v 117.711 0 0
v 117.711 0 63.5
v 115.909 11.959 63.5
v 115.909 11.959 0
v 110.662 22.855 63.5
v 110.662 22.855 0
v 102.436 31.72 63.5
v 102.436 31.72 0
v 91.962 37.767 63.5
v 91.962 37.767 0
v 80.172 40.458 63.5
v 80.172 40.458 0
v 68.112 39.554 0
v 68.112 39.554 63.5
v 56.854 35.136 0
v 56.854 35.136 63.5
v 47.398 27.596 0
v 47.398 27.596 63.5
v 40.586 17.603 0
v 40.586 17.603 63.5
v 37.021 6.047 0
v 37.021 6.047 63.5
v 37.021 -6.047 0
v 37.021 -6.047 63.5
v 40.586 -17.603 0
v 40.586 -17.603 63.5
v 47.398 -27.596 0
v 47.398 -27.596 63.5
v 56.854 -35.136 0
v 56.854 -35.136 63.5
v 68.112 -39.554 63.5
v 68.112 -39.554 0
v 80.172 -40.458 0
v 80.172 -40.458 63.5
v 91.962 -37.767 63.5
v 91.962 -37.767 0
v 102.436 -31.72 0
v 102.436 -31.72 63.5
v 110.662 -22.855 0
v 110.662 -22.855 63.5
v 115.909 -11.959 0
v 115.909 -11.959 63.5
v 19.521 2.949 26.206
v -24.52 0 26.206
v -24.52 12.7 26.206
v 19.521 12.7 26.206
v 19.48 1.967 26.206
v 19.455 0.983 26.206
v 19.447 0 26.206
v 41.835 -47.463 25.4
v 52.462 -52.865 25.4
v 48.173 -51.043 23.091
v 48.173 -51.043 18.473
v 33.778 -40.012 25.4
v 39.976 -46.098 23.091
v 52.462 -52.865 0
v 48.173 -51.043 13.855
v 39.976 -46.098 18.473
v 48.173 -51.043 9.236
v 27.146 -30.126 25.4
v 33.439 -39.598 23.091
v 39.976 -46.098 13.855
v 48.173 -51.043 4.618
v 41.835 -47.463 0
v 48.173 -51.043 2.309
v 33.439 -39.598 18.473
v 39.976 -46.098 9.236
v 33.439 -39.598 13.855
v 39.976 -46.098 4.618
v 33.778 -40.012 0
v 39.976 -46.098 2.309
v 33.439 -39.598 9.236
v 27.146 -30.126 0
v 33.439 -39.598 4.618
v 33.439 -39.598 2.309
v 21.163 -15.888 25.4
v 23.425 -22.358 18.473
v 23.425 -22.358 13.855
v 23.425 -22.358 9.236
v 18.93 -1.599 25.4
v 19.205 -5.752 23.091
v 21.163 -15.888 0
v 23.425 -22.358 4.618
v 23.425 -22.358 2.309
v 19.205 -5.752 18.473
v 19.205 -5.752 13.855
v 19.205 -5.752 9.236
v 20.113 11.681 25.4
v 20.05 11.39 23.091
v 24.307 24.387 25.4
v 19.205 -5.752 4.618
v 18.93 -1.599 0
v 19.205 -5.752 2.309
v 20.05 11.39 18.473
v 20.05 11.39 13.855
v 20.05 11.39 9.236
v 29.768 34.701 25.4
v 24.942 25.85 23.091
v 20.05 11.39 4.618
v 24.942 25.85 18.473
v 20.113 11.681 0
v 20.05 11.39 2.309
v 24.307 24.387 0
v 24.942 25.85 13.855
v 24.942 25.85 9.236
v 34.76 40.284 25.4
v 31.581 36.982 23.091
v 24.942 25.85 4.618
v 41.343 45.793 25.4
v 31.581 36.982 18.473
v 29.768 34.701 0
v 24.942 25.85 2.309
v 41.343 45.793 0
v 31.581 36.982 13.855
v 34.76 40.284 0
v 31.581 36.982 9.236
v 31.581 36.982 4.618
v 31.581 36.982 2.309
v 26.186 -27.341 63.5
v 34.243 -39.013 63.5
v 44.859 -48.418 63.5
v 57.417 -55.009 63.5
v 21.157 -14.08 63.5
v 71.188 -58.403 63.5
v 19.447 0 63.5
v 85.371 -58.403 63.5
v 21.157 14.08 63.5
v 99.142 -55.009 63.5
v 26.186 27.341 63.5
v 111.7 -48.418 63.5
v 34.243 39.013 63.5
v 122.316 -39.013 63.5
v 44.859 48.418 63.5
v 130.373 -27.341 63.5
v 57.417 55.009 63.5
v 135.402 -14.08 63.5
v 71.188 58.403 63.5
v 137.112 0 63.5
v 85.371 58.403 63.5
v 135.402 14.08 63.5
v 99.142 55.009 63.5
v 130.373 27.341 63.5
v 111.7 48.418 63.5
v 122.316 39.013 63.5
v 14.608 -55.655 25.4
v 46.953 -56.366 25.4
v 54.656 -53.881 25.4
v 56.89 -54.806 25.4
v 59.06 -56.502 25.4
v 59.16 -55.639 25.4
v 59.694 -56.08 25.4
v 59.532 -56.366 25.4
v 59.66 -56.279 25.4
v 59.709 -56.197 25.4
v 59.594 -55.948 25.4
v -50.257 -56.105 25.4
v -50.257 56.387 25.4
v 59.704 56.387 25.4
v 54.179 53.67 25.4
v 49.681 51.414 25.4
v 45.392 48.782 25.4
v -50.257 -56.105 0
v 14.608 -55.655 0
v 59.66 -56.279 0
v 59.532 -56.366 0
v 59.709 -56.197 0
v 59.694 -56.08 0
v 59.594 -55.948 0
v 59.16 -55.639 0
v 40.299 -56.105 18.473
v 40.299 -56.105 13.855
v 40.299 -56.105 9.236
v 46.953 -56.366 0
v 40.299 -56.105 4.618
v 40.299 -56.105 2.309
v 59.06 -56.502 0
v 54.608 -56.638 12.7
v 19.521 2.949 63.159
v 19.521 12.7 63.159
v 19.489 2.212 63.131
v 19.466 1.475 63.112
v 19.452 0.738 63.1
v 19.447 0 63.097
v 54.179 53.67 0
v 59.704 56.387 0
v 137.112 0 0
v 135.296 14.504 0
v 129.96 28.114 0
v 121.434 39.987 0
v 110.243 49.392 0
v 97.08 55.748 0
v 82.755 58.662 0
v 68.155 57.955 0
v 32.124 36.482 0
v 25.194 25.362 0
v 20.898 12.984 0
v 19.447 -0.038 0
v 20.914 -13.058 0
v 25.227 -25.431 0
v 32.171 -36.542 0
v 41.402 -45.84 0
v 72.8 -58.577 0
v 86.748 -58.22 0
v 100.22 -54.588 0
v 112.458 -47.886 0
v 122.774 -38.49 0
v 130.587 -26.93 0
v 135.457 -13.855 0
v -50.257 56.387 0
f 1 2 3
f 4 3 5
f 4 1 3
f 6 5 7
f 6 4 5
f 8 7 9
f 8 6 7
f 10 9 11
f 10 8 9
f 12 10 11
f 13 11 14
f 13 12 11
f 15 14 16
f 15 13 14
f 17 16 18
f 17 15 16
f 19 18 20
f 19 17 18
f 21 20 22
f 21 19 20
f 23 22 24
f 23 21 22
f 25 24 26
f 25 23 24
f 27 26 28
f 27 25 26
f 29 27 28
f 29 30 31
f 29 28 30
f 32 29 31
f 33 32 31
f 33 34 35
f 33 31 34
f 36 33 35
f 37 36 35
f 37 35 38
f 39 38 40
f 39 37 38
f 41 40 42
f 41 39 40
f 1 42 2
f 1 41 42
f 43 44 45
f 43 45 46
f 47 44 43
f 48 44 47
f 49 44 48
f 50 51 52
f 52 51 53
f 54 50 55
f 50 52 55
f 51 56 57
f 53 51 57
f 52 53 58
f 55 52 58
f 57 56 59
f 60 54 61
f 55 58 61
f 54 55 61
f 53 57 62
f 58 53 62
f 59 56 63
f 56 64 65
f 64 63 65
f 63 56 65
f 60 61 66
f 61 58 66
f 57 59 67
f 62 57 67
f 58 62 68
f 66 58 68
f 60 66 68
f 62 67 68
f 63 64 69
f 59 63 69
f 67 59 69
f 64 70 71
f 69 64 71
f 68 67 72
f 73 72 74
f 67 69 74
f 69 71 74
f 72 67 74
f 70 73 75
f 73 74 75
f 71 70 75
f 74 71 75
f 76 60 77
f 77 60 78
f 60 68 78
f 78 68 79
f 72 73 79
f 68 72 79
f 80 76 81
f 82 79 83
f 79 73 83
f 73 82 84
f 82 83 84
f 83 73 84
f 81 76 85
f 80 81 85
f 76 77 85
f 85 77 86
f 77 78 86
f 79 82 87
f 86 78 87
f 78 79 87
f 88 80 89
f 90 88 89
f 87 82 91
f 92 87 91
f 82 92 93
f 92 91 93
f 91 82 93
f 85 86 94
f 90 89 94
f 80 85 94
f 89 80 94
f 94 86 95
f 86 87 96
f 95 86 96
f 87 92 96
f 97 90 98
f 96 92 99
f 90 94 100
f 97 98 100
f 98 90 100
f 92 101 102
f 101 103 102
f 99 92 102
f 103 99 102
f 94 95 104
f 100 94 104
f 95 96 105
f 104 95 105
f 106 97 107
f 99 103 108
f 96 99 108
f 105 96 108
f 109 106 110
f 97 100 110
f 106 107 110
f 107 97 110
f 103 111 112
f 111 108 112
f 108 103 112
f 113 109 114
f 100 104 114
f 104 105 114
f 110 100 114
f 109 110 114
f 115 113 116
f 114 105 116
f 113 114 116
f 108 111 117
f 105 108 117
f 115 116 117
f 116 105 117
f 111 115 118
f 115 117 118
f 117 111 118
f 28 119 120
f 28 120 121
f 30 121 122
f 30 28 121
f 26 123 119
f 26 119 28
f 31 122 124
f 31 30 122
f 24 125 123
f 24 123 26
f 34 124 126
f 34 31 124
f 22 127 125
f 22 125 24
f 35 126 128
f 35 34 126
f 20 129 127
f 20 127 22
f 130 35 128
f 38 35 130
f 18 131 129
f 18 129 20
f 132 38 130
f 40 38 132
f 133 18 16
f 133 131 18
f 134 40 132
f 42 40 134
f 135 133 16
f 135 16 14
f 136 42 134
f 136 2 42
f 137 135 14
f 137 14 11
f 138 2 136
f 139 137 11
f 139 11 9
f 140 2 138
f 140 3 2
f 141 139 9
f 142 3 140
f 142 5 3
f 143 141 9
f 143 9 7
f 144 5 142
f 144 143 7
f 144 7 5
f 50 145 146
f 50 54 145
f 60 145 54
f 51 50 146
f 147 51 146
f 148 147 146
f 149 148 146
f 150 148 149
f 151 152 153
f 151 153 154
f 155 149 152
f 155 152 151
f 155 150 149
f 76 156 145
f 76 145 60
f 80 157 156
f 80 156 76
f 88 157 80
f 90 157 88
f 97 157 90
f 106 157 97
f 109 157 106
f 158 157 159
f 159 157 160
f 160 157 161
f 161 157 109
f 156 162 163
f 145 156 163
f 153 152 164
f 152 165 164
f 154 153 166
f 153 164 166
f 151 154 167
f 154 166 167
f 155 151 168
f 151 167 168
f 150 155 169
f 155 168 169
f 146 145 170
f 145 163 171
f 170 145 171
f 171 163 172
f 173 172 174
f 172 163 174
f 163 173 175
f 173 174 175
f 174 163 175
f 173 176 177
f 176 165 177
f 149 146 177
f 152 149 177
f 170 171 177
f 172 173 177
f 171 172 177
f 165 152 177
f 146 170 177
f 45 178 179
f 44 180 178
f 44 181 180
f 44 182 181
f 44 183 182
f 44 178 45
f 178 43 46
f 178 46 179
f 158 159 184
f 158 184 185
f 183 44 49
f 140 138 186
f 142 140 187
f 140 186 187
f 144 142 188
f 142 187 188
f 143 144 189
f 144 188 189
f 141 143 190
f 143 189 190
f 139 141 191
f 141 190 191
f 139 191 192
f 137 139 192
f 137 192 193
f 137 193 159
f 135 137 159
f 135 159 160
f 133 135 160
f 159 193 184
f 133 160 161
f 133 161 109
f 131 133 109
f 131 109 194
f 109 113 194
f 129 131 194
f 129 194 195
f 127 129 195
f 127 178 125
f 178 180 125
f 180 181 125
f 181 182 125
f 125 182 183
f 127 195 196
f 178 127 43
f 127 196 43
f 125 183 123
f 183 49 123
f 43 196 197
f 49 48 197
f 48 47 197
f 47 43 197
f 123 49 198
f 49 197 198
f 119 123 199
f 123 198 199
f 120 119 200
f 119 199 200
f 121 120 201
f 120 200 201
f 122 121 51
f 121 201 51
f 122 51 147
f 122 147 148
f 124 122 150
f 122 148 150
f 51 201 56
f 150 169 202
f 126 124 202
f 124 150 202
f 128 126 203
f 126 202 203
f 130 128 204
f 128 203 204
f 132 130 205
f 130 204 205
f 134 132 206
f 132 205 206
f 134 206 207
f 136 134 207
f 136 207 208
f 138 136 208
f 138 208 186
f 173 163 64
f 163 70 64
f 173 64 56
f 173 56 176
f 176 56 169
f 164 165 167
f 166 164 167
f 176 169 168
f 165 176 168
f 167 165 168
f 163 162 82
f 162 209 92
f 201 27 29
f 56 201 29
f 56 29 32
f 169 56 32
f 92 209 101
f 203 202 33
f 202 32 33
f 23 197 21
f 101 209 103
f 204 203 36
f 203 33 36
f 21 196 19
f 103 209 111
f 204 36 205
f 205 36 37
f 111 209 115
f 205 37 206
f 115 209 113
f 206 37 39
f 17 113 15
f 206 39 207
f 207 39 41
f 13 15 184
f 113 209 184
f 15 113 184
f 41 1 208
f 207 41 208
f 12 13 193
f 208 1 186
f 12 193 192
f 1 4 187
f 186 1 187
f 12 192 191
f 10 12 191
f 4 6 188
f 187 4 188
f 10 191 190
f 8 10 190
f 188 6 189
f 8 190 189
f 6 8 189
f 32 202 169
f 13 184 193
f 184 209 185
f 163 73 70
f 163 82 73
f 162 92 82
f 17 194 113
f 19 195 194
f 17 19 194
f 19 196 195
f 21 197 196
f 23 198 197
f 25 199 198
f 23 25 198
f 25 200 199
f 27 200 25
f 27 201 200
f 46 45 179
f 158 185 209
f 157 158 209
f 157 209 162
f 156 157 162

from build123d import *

# Parameters (mm, degrees)
F0_R     = 58.8324156358
F1_DEPTH = 63.5
F2_R     = 40.5716909801
F3_DEPTH = 63.501
F5_DEPTH = 25.4
F7_DEPTH = 12.7


with BuildPart() as f1:
    # F0 (on Top) → F1 (new body)
    with BuildSketch(Plane.XY):
        with Locations((78.2794505358, 0)):
            Circle(F0_R)
    extrude(amount=F1_DEPTH)

    # F2 (on Top) → F3 (cut, through all)
    with BuildSketch(Plane.XY):
        with Locations((77.139608562, 0)):
            Circle(F2_R)
    extrude(amount=F3_DEPTH, mode=Mode.SUBTRACT)

    # F4 (on Top) → F5 (join)
    with BuildSketch(Plane.XY):
        with BuildLine():
            add(Edge.make_bspline(
                [(-50.2571389079, -56.1054311693), (-16.7832059207, -55.6967128398), (32.1861465243, -55.0987946945), (67.1425862644, -57.641467666), (45.7816152555, -51.1111653509), (33.0959452068, -41.131486421), (22.5874521406, -22.5952197622), (18.4327377492, -5.9917502981), (19.0387832668, 11.3825225281), (25.1956842548, 27.0460198571), (30.7814993553, 37.5243375445), (45.4991432323, 49.5310228176), (55.0799139421, 54.1549944447), (59.7038790584, 56.3866607845)],
                knots=[0, 0, 0, 0, 0.1891612959, 0.2767259579, 0.3472655422, 0.4317314301, 0.5218364542, 0.6040854661, 0.6864673203, 0.766880288, 0.8353517069, 0.920535833, 1, 1, 1, 1], degree=3))
            Line((59.7038790584, 56.3866607845), (-50.2571389079, 56.3866607845))
            Line((-50.2571389079, 56.3866607845), (-50.2571389079, -56.1054311693))
        make_face()
    extrude(amount=F5_DEPTH)

    # F6 (on Front) → F7 (join)
    with BuildSketch(Plane.XZ):
        Polygon((19.521009177, 26.206118986), (19.521009177, 63.1586238742), (-24.5204272107, 26.206118986), align=None)
    extrude(amount=-F7_DEPTH)


solid = f1.part
